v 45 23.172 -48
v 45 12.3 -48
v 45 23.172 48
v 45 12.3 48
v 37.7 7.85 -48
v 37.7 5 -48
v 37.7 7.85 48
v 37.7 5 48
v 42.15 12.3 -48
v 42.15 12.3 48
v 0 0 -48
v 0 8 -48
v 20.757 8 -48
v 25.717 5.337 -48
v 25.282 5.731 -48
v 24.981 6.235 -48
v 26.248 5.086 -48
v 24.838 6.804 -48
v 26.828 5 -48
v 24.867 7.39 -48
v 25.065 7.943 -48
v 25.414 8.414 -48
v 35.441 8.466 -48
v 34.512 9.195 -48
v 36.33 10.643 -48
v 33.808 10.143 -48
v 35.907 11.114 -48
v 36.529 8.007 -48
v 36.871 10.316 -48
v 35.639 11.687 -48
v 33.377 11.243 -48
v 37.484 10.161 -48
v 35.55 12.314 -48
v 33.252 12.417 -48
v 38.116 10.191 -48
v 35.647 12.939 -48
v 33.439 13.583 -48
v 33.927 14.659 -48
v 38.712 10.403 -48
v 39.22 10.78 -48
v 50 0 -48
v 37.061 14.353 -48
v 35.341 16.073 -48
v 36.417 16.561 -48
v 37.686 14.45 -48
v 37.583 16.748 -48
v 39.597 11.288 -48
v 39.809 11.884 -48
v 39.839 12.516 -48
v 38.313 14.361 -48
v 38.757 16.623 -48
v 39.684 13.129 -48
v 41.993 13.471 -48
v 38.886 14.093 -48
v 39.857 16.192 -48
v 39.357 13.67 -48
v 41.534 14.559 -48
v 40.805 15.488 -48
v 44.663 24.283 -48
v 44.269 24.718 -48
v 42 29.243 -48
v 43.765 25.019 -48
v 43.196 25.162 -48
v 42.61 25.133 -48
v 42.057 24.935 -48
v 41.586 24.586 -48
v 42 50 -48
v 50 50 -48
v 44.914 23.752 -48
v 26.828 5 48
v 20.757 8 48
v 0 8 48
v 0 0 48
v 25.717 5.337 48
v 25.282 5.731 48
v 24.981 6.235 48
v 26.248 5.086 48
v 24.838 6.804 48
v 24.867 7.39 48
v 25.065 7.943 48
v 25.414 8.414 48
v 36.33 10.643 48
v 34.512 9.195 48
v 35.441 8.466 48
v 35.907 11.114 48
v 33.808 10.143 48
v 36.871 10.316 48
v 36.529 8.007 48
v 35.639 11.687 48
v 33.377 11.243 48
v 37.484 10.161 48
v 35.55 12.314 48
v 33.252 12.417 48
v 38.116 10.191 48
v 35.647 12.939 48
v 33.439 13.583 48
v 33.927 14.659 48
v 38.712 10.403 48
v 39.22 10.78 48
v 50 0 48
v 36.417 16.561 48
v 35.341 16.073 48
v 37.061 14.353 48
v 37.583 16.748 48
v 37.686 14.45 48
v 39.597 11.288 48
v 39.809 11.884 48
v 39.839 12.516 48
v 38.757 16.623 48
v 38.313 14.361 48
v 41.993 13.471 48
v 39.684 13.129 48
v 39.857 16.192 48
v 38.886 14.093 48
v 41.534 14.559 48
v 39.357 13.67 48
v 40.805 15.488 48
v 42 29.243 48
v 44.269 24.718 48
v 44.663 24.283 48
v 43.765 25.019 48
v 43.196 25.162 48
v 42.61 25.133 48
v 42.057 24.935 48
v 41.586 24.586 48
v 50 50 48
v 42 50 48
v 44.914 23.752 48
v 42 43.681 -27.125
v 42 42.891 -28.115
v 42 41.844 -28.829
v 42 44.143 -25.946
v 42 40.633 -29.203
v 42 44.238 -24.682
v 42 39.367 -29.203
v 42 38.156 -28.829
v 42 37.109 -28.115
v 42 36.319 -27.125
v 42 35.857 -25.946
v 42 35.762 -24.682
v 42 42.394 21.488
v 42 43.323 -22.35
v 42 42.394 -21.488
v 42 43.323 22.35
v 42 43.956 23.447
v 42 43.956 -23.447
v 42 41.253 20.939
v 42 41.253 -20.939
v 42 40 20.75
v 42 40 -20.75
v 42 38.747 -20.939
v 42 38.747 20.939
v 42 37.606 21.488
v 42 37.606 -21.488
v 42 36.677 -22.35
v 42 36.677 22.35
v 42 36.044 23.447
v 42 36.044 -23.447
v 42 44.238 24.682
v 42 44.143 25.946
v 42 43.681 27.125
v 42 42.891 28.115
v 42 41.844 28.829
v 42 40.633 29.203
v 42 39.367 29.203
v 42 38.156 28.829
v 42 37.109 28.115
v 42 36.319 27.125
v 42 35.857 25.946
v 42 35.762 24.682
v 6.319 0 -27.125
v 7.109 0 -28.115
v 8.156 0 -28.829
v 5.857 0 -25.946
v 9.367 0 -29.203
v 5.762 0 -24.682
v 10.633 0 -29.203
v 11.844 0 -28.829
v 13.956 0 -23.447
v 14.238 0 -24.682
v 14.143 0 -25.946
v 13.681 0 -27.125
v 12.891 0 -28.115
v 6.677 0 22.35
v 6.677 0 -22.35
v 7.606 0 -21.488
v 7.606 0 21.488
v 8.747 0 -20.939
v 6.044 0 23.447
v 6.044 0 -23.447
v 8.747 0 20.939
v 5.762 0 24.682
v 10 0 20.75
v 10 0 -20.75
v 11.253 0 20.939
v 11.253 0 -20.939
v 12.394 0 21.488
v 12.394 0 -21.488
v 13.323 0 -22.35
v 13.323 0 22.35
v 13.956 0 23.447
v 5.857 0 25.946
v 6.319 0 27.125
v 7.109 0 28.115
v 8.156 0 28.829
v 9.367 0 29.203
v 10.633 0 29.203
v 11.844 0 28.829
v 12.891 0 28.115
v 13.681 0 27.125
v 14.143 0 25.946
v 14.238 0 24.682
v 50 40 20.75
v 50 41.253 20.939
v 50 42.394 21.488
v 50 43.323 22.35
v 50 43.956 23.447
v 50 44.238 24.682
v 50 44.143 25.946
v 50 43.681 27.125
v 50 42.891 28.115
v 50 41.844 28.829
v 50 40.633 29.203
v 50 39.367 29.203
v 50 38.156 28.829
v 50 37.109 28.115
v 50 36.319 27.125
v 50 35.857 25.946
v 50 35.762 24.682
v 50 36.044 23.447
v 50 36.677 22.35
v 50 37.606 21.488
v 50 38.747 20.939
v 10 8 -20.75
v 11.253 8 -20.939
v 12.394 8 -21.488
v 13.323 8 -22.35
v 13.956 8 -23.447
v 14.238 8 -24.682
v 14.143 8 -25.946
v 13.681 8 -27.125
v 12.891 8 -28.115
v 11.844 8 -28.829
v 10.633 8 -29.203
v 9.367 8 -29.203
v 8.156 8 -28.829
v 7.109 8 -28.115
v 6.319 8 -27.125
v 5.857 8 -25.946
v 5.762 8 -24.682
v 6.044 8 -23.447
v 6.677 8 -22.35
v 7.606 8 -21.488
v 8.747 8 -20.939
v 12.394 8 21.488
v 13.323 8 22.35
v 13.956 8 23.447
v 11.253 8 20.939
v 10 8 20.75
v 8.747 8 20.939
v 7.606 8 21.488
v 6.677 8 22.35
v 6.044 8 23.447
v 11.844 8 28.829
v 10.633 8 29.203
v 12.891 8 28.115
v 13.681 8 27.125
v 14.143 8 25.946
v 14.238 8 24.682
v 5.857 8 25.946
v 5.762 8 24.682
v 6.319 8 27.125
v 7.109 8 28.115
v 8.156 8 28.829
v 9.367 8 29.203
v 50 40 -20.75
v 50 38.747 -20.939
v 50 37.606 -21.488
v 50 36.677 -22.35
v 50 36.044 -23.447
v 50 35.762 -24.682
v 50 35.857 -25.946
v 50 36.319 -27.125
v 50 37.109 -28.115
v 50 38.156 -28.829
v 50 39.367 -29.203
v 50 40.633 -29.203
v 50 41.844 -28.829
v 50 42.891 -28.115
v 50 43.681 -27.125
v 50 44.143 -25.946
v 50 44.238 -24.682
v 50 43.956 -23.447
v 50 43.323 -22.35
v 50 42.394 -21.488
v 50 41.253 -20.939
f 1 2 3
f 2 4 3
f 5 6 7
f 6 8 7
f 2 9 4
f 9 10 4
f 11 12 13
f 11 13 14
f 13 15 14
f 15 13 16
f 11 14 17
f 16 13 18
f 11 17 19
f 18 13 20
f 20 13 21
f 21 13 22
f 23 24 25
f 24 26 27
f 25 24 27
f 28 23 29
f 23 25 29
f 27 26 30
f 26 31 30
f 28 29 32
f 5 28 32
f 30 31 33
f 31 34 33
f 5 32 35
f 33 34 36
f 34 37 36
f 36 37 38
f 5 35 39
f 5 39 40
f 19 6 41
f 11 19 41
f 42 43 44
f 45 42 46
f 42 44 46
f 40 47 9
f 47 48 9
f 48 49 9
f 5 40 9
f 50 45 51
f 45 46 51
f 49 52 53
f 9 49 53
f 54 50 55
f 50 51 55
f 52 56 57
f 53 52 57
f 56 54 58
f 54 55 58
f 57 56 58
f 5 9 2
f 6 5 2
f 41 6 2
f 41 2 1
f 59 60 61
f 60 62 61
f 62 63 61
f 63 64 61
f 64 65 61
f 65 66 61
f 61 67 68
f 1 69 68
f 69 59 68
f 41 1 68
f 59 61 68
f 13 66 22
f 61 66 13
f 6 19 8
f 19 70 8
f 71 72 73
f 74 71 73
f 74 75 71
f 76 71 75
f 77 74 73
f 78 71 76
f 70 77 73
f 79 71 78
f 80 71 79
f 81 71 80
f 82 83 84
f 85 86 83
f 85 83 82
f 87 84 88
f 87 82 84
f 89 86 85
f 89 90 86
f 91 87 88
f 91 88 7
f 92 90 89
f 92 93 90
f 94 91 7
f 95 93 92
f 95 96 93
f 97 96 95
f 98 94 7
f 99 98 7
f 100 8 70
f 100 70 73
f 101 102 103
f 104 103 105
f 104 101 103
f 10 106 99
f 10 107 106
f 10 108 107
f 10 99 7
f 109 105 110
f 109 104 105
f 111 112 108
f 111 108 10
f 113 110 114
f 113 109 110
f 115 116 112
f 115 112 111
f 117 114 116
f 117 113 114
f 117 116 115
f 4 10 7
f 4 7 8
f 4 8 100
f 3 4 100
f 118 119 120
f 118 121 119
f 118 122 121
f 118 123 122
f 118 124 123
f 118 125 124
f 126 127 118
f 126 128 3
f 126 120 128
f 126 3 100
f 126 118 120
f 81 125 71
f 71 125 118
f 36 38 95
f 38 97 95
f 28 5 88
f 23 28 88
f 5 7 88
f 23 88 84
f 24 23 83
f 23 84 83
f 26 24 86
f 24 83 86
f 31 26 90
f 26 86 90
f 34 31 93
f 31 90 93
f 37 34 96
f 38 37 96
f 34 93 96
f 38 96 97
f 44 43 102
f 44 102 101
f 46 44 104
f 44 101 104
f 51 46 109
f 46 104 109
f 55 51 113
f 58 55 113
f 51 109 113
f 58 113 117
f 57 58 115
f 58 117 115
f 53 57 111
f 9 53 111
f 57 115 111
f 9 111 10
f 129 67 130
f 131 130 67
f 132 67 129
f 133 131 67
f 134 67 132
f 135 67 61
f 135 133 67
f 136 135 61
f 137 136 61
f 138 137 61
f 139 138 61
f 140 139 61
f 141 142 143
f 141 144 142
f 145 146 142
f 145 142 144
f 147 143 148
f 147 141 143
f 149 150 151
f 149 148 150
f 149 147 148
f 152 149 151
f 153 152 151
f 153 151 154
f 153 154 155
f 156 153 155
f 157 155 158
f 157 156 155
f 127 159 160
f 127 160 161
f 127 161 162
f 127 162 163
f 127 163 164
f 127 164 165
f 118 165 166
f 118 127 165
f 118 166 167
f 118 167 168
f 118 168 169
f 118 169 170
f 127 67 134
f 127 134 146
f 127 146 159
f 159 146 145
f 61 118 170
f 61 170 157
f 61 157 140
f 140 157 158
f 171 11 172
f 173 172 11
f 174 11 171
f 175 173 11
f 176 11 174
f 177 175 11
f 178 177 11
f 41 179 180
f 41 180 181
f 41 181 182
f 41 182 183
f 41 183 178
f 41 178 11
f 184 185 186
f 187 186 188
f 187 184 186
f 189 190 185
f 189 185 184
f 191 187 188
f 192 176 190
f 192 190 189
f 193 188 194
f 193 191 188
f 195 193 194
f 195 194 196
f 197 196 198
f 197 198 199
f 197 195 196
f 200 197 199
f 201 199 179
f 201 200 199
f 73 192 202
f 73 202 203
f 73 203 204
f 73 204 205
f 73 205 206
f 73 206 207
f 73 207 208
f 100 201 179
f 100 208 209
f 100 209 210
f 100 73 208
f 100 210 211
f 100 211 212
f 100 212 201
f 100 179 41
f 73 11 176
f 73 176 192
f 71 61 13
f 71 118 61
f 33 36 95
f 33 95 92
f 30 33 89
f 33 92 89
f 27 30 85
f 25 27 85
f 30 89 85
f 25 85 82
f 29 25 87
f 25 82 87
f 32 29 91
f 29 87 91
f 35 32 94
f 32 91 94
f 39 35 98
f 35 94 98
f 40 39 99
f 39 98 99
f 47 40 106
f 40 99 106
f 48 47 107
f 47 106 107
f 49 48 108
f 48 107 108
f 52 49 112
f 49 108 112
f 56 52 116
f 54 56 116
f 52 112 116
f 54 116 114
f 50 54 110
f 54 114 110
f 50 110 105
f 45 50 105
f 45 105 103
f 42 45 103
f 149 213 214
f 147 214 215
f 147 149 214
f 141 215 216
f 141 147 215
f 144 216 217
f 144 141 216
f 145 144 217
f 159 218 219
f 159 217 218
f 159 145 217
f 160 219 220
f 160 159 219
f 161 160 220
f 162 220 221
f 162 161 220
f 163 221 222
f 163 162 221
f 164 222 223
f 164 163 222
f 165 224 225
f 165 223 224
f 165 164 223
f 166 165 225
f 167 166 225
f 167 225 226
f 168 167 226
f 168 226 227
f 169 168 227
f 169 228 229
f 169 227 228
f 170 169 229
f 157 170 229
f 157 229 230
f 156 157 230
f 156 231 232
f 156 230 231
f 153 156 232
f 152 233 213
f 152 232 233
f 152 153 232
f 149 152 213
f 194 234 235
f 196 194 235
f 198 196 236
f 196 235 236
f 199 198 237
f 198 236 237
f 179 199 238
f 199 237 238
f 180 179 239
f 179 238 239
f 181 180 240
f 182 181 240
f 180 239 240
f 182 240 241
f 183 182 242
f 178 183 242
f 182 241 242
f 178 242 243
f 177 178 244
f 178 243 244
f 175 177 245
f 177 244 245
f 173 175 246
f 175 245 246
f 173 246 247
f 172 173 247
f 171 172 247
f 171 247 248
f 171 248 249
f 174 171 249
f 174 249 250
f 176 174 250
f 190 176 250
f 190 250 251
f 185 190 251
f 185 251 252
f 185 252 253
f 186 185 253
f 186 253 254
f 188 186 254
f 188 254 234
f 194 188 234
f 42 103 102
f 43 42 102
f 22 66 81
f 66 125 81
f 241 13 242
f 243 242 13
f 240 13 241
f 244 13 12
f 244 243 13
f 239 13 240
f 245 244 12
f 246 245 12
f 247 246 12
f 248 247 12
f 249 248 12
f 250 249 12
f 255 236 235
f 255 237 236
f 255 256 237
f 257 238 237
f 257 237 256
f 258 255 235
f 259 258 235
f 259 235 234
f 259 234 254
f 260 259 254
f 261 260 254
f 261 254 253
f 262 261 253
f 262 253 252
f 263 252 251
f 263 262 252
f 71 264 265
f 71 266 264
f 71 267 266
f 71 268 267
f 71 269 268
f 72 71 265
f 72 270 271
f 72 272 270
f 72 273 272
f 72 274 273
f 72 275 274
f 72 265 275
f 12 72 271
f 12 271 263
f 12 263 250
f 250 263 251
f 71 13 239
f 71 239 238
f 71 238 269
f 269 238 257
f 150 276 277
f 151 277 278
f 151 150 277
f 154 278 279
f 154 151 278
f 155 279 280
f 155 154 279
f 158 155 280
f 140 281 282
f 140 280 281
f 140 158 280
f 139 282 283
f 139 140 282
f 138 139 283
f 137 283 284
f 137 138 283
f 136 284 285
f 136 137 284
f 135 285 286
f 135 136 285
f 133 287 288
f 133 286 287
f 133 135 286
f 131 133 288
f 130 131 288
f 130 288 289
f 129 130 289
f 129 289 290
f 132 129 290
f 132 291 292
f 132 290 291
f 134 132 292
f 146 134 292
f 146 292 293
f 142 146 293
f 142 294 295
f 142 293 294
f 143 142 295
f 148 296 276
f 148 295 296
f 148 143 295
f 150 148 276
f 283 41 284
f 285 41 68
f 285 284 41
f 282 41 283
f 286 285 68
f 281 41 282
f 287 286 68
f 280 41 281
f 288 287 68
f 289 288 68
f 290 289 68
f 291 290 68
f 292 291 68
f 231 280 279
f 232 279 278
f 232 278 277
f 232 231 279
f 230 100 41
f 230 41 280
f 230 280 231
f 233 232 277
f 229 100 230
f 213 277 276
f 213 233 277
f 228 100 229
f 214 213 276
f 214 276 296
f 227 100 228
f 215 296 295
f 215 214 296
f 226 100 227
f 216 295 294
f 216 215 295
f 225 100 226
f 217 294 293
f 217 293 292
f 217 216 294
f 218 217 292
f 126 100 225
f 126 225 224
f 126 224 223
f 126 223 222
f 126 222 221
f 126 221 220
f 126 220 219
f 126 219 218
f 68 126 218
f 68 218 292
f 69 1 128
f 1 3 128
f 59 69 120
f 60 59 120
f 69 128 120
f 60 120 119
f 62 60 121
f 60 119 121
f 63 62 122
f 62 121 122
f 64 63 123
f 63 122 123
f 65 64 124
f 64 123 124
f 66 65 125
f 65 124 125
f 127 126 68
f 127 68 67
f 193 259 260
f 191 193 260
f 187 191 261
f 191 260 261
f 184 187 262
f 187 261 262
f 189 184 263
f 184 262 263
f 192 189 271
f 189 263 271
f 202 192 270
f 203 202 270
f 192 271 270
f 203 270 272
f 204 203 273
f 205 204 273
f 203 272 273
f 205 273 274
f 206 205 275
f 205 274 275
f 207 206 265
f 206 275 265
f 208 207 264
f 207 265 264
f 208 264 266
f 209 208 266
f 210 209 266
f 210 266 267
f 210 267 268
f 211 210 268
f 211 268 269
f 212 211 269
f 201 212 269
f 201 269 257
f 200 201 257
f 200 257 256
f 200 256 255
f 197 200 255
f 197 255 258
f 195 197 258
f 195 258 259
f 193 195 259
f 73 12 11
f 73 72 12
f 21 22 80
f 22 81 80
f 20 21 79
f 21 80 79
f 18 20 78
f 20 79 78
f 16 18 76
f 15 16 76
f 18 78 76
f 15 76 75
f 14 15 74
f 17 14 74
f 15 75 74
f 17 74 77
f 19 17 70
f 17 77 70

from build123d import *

# Parameters (mm, degrees)
EXTRUDE_1_DEPTH     = 48
SKETCH_3_R          = 4.25
CUT_EXTRUDE_1_DEPTH = 82.043198357


with BuildPart() as part:
    # 草图1 → 凸台-拉伸1 (new, symmetric)
    with BuildSketch(Plane.XY):
        Polygon((0, 0), (50, 0), (50, 50), (42, 50), (42, 29.242640687), (20.757359313, 8), (0, 8), align=None)
        with BuildLine():
            Line((37.061279898, 14.352933665), (35.340960992, 16.07325257))
            ThreePointArc((35.340960992, 16.07325257), (39.856939547, 16.192314452), (42.15, 12.3))
            Line((42.15, 12.3), (45, 12.3))
            Line((45, 12.3), (45, 23.171572875))
            ThreePointArc((45, 23.171572875), (43.765366865, 25.01933194), (41.585786438, 24.585786438))
            Line((41.585786438, 24.585786438), (25.414213562, 8.414213562))
            ThreePointArc((25.414213562, 8.414213562), (24.98066806, 6.234633135), (26.828427125, 5))
            Line((26.828427125, 5), (37.7, 5))
            Line((37.7, 5), (37.7, 7.85))
            ThreePointArc((37.7, 7.85), (33.807685548, 10.143060453), (33.92674743, 14.659039008))
            Line((33.92674743, 14.659039008), (35.647066335, 12.938720102))
            ThreePointArc((35.647066335, 12.938720102), (39.22027958, 10.77972042), (37.061279898, 14.352933665))
        make_face(mode=Mode.SUBTRACT)
    extrude(amount=EXTRUDE_1_DEPTH, both=True)

    # 草图3 → 切除-拉伸1 (cut, through all)
    with BuildSketch(Plane(origin=(0, 8, 0), x_dir=(1, 0, 0), z_dir=(0, 1, 0))):
        with Locations(Location((10, 25, 0), (0, 0, 270))):
            Circle(SKETCH_3_R)
        with Locations(Location((10, -25, 0), (0, 0, 90))):
            Circle(SKETCH_3_R)
    cut_extrude_1 = extrude(amount=-CUT_EXTRUDE_1_DEPTH, mode=Mode.SUBTRACT)

    # 镜向1: 切除-拉伸1 across plane
    add(cut_extrude_1.mirror(Plane(origin=(25, 25, 0), x_dir=(0, 0, 1), z_dir=(-0.7071067811865486, -0.7071067811865465, 0))), mode=Mode.SUBTRACT)


solid = part.part
